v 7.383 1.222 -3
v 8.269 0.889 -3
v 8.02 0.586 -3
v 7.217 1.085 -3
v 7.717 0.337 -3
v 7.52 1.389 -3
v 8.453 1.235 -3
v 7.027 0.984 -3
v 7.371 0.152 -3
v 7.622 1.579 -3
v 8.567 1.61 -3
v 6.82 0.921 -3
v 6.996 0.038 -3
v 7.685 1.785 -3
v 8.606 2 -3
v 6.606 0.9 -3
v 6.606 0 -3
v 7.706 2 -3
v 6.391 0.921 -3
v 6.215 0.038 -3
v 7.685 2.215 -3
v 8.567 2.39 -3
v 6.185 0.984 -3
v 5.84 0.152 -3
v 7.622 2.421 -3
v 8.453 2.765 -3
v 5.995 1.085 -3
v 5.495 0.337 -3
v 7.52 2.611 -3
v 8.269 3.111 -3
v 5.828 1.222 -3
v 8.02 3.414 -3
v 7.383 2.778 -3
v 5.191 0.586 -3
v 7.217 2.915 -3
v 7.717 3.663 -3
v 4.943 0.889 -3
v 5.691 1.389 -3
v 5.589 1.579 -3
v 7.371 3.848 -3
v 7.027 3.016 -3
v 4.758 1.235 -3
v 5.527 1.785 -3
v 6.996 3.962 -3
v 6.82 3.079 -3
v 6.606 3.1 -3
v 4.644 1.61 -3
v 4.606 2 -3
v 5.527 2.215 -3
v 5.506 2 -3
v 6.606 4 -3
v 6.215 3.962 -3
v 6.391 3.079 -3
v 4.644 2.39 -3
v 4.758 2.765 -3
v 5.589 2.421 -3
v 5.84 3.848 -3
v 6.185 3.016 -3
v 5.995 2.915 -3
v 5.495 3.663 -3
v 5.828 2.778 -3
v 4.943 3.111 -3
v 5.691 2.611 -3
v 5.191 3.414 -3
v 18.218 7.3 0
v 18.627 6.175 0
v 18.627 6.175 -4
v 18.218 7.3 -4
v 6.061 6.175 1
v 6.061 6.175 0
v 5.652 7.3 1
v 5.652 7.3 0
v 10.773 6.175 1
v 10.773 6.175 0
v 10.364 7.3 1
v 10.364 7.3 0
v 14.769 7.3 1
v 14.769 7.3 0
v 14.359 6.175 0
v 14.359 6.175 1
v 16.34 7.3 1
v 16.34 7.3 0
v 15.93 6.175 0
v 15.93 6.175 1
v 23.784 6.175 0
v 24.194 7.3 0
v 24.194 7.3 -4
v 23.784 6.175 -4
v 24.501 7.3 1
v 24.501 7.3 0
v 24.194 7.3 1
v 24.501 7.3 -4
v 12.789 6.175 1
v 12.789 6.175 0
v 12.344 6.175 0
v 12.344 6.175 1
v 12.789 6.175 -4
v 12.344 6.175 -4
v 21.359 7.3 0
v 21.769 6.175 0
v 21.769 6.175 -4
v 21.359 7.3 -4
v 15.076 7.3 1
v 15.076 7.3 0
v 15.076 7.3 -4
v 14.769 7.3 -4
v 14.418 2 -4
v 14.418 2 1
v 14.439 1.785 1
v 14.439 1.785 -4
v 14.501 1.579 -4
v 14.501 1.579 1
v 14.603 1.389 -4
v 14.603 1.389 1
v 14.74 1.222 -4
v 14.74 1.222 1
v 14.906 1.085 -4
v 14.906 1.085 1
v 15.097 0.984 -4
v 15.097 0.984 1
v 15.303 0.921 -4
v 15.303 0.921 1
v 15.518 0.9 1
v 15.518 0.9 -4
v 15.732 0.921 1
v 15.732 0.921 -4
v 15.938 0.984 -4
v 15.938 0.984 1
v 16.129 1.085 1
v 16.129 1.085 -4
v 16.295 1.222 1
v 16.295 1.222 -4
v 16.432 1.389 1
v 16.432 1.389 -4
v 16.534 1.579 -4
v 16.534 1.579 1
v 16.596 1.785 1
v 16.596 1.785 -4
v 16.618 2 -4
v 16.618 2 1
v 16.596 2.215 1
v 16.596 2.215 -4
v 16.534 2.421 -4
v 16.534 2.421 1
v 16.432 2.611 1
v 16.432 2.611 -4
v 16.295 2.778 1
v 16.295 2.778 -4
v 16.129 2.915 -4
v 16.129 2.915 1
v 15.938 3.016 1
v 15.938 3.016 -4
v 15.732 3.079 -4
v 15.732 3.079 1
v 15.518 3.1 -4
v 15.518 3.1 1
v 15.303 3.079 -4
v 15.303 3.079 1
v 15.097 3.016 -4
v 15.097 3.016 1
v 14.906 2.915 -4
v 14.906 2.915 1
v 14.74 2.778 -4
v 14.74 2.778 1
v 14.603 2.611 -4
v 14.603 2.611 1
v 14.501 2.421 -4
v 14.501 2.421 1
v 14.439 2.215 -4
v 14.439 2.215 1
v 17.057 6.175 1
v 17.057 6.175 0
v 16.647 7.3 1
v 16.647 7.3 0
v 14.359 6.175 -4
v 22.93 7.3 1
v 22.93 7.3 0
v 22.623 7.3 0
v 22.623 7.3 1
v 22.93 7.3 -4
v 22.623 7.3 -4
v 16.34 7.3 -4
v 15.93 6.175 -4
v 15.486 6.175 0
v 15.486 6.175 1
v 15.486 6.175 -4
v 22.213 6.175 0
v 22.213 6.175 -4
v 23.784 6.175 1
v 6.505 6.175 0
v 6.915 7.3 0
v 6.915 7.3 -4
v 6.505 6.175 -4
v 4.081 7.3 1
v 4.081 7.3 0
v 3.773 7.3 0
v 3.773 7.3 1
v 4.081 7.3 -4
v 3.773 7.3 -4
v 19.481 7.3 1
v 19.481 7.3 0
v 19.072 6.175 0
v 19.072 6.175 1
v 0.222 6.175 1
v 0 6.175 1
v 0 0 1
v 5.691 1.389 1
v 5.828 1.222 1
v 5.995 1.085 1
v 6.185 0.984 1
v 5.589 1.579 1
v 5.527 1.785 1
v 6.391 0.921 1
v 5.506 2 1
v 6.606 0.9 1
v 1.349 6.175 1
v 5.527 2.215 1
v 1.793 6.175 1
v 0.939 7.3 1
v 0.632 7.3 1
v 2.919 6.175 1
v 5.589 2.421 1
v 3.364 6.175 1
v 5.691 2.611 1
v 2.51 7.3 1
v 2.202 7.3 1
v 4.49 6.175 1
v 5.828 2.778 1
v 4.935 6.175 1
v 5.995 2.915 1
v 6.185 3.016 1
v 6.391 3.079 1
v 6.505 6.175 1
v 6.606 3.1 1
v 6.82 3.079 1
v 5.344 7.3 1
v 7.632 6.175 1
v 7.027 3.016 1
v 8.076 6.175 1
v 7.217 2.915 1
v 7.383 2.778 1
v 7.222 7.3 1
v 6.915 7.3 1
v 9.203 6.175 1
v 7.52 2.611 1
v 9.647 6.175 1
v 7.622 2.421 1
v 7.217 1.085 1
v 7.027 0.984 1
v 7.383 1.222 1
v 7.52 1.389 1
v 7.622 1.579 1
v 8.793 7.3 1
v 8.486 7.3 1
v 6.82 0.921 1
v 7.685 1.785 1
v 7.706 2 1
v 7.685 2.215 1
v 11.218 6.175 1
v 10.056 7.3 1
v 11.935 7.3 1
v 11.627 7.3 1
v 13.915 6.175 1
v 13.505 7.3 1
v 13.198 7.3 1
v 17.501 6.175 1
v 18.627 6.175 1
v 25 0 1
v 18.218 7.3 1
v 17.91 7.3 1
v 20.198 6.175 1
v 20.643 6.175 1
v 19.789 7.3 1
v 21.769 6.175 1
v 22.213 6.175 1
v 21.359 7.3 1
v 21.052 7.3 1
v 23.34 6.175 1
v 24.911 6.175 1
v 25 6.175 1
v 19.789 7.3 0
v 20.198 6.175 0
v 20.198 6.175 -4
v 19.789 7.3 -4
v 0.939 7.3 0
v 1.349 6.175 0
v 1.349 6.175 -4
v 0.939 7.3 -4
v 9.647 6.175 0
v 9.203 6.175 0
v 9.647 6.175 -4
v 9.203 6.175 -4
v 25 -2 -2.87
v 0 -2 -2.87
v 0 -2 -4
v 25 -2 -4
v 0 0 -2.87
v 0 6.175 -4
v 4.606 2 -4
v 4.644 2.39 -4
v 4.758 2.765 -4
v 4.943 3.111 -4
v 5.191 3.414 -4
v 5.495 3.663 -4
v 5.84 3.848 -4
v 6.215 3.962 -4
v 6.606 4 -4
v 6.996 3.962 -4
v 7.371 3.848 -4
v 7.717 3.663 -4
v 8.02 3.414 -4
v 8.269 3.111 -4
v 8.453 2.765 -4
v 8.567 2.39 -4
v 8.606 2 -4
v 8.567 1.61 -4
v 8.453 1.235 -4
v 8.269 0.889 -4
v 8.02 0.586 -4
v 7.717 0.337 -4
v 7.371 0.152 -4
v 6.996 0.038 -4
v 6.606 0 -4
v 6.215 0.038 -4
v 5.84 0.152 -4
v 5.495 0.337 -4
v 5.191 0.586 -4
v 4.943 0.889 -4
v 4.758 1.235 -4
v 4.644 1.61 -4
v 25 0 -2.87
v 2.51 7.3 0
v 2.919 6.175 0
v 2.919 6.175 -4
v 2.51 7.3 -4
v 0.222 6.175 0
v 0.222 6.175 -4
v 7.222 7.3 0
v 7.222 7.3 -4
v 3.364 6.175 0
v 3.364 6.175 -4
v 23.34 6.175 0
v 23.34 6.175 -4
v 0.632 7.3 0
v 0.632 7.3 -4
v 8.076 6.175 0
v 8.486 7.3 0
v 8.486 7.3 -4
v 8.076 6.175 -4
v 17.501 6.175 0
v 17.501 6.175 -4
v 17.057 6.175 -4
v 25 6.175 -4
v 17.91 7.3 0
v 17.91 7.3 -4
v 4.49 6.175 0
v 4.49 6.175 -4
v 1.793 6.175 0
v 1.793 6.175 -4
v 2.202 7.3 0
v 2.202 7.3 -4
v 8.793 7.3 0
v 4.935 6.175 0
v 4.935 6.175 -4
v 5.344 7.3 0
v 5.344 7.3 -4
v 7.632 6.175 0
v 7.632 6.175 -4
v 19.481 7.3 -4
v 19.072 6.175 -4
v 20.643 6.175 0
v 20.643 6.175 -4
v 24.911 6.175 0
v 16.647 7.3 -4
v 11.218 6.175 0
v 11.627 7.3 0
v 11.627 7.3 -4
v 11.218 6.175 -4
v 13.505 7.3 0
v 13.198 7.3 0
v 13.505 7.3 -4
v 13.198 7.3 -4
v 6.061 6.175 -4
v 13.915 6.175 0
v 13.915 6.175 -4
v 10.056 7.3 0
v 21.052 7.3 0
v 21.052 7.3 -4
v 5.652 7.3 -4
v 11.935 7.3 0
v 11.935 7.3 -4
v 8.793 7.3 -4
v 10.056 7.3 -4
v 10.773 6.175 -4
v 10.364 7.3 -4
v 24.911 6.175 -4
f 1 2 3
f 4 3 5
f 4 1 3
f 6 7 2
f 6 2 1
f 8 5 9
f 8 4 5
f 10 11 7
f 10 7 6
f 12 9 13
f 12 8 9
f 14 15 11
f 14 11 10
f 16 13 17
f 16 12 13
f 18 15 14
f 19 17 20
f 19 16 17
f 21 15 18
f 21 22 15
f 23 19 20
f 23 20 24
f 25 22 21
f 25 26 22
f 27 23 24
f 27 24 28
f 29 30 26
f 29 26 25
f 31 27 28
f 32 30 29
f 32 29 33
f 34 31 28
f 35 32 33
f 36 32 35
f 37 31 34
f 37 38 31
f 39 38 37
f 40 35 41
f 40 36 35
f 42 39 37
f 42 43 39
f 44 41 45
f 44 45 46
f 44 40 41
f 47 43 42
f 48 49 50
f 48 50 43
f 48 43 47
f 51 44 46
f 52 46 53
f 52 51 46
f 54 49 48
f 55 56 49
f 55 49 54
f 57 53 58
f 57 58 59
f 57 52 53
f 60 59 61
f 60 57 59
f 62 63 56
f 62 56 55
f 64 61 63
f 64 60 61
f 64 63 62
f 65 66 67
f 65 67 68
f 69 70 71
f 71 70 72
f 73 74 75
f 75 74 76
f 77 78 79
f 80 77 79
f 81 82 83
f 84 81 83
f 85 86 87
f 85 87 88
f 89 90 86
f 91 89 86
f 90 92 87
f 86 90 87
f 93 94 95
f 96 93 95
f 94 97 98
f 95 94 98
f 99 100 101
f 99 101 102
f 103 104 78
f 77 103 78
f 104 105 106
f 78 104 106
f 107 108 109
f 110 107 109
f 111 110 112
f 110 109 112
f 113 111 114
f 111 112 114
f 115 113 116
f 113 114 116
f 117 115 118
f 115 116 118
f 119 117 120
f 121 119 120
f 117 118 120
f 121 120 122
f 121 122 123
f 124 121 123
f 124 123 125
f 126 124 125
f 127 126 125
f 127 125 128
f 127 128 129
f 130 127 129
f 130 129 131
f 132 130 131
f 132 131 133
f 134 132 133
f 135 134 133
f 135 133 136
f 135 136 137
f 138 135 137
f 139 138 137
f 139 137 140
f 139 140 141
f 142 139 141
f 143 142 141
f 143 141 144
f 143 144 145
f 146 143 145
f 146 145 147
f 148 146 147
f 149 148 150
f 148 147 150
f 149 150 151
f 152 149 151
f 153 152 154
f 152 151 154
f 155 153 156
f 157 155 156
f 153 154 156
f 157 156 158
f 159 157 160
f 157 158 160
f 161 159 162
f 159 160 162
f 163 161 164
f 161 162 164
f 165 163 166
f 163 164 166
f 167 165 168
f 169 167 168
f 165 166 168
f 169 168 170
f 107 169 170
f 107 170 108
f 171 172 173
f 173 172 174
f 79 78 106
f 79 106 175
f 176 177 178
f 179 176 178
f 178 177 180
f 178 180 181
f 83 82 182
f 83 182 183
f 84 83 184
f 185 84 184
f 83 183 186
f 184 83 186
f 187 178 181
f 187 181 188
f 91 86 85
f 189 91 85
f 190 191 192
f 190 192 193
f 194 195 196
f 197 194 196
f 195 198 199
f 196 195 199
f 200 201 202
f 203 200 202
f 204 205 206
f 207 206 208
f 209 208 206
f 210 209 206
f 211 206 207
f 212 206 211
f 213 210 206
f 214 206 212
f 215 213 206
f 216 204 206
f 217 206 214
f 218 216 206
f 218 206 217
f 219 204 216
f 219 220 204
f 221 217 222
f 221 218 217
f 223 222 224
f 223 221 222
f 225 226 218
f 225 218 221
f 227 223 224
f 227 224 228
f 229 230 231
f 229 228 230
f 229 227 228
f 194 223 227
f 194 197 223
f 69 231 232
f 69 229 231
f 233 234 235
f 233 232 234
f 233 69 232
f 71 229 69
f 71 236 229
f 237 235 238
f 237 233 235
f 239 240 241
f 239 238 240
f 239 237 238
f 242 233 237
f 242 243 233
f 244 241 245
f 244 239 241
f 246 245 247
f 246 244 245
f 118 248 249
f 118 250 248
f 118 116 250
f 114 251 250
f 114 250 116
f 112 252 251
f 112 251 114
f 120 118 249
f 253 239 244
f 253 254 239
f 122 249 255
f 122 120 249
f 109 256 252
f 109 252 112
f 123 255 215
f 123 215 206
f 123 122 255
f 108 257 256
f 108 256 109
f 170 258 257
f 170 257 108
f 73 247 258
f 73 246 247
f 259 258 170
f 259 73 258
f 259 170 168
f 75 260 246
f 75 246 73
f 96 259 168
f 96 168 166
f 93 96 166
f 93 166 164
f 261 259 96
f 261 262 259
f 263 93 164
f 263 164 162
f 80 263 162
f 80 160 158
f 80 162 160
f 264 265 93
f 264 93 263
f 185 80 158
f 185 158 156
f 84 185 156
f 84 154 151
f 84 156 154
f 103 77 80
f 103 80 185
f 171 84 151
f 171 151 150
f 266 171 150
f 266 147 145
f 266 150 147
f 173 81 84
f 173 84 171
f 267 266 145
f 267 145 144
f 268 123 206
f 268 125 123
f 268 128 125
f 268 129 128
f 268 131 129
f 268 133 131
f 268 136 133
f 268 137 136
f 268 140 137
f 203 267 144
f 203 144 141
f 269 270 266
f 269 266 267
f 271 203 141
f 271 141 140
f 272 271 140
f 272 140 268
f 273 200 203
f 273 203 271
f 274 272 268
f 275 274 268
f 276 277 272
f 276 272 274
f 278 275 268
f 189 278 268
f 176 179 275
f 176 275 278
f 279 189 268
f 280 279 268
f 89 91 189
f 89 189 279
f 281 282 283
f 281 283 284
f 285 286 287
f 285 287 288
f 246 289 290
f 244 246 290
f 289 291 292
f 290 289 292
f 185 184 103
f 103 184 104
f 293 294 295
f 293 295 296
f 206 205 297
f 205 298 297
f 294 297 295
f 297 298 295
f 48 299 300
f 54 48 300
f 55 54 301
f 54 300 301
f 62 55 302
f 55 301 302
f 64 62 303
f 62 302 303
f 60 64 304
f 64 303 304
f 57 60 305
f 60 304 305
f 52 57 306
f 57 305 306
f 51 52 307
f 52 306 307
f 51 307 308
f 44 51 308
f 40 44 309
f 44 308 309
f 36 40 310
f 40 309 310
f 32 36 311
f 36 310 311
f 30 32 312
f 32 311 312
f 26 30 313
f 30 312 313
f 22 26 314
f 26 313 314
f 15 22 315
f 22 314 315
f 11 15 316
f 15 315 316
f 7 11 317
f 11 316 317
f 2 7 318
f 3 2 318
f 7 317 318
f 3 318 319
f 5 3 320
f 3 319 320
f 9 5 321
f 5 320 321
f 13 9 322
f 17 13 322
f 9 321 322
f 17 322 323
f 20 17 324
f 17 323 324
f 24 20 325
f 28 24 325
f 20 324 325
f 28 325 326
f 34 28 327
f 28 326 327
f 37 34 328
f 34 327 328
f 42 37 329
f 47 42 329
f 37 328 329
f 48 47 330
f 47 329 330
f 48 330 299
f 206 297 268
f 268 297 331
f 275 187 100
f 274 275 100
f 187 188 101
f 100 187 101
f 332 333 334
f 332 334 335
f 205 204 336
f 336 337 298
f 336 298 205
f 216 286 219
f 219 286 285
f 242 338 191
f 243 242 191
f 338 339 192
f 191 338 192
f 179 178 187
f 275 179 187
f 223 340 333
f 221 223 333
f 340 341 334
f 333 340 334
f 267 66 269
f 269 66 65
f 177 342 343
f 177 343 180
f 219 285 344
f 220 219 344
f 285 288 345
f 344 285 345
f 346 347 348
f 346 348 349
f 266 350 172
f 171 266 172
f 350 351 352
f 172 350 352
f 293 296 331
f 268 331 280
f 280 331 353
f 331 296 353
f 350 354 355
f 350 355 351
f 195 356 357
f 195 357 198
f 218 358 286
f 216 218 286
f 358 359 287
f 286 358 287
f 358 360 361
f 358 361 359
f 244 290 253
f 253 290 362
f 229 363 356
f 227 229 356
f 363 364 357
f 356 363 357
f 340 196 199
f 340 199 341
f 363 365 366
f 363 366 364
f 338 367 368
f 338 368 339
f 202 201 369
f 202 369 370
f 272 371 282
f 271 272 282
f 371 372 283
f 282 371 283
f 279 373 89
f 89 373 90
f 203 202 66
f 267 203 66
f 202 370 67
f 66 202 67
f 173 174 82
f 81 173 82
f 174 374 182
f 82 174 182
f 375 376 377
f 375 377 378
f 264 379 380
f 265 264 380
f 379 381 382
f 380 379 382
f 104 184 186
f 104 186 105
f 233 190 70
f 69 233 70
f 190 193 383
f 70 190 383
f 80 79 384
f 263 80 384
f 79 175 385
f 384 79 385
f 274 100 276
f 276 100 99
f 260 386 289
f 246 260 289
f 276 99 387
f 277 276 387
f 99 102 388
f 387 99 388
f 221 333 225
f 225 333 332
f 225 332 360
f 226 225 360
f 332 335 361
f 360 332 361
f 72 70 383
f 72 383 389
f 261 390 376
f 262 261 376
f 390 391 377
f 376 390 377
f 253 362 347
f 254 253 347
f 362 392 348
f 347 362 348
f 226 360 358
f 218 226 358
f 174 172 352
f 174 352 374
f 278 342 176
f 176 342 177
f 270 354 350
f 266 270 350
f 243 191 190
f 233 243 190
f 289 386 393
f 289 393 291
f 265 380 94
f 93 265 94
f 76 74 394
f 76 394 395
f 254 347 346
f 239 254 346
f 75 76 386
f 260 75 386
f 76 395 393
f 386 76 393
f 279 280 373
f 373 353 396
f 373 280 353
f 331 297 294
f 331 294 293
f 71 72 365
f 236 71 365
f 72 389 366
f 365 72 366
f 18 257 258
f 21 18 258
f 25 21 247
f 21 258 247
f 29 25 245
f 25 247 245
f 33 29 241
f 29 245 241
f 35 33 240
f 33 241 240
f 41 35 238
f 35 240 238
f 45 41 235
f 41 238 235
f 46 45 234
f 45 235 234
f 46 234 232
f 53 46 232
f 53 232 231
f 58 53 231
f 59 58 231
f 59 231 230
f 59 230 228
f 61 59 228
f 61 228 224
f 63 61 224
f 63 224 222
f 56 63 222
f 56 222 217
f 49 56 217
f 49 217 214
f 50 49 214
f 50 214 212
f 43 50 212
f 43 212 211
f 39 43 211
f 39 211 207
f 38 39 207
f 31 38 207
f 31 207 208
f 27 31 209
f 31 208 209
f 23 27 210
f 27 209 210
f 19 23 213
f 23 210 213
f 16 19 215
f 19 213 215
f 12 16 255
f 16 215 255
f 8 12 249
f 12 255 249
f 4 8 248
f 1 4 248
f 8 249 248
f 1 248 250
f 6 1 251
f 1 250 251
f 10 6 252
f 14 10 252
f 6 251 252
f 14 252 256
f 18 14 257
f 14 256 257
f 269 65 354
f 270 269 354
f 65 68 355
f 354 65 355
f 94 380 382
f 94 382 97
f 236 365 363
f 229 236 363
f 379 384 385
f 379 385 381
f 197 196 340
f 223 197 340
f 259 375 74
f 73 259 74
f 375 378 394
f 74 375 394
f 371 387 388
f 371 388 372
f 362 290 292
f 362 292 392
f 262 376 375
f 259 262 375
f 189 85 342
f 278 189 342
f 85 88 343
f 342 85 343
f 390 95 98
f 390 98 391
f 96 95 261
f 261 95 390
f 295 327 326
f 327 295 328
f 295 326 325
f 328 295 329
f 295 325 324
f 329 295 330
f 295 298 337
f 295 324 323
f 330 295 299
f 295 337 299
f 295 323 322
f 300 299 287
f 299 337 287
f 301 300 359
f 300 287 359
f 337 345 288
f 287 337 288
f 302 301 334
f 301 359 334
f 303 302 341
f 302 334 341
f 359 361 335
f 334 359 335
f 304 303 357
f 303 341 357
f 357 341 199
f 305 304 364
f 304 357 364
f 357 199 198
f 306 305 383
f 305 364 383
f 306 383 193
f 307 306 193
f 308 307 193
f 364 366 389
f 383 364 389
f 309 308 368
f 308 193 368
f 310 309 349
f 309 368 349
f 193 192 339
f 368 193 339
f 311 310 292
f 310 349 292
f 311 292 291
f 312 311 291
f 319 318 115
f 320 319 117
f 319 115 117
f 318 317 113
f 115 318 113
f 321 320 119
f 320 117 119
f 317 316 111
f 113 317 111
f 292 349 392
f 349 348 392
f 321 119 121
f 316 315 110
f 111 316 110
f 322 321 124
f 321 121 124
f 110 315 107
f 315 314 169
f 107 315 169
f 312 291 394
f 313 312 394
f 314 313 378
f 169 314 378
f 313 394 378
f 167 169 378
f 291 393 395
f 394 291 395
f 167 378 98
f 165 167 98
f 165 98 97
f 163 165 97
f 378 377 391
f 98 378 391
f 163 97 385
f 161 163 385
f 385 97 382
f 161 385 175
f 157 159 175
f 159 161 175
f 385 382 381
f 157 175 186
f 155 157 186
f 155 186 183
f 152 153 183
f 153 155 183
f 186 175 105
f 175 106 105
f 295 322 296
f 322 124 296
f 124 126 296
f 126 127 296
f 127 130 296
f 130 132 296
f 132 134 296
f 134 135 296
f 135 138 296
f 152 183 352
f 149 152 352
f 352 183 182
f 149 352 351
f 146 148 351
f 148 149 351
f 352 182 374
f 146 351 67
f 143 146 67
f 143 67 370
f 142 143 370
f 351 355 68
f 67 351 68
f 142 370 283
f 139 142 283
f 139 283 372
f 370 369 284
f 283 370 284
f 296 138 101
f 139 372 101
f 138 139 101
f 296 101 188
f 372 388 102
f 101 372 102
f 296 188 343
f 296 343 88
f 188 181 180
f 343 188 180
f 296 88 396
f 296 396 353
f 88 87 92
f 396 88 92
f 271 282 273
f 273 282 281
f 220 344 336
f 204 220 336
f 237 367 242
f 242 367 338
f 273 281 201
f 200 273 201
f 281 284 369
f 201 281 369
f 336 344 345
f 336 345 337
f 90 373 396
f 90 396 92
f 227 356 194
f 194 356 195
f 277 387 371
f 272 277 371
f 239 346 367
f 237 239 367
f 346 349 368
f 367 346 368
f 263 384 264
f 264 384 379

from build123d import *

# Parameters (mm, degrees)
BLANKSKE_W          = 25
BLANKSKE_H          = 7.3
BLANK_DEPTH         = 4
TOOTHCUTSIM_DEPTH   = 27.349383294
TEETHCUTS_COUNT     = 17
TEETHCUTS_PITCH     = 1.570796325
SKETCH4_W           = 25
SKETCH4_H           = 1.13
BOSS_EXTRUDE1_DEPTH = 2
BOSS_EXTRUDE2_DEPTH = 1
CUT_EXTRUDE1_DEPTH  = 10
SKETCH10_R          = 2
CUT_EXTRUDE3_DEPTH  = 1


with BuildPart() as part:
    # BlankSke → Blank (new body)
    with BuildSketch(Plane.XY):
        with Locations((12.5, 3.65)):
            Rectangle(BLANKSKE_W, BLANKSKE_H)
    extrude(amount=-BLANK_DEPTH)

    # TooCutSkeSim → ToothCutSim (cut, through all)
    with BuildSketch(Plane.XY):
        Polygon((0.222217685, 6.175), (-0.222217685, 6.175), (-0.640929042, 7.3254), (0.640929042, 7.3254), align=None)
    toothcutsim = extrude(amount=-TOOTHCUTSIM_DEPTH, mode=Mode.SUBTRACT)

    # TeethCuts: ToothCutSim ×17
    with Locations(*[(i * TEETHCUTS_PITCH, 0, 0) for i in range(1, TEETHCUTS_COUNT)]):
        add(toothcutsim, mode=Mode.SUBTRACT)

    # Sketch4 → Boss-Extrude1 (add)
    with BuildSketch(Plane.XZ):
        with Locations((12.5, -3.435)):
            Rectangle(SKETCH4_W, SKETCH4_H)
    extrude(amount=BOSS_EXTRUDE1_DEPTH)

    # Sketch7 → Boss-Extrude2 (add)
    with BuildSketch(Plane.XY):
        Polygon((25, 6.175), (24.910523515, 6.175), (24.501057002, 7.3), (24.193629073, 7.3), (23.78416256, 6.175), (23.33972719, 6.175), (22.930260677, 7.3), (22.622832748, 7.3), (22.213366235, 6.175), (21.768930865, 6.175), (21.359464352, 7.3), (21.052036423, 7.3), (20.64256991, 6.175), (20.19813454, 6.175), (19.788668027, 7.3), (19.481240098, 7.3), (19.071773585, 6.175), (18.627338215, 6.175), (18.217871702, 7.3), (17.910443773, 7.3), (17.50097726, 6.175), (17.05654189, 6.175), (16.647075377, 7.3), (16.339647448, 7.3), (15.930180935, 6.175), (15.485745565, 6.175), (15.076279052, 7.3), (14.768851123, 7.3), (14.35938461, 6.175), (13.91494924, 6.175), (13.505482727, 7.3), (13.198054798, 7.3), (12.788588285, 6.175), (12.344152915, 6.175), (11.934686402, 7.3), (11.627258473, 7.3), (11.21779196, 6.175), (10.77335659, 6.175), (10.363890077, 7.3), (10.056462148, 7.3), (9.646995635, 6.175), (9.202560265, 6.175), (8.793093752, 7.3), (8.485665823, 7.3), (8.07619931, 6.175), (7.63176394, 6.175), (7.222297427, 7.3), (6.914869498, 7.3), (6.505402985, 6.175), (6.060967615, 6.175), (5.651501102, 7.3), (5.344073173, 7.3), (4.93460666, 6.175), (4.49017129, 6.175), (4.080704777, 7.3), (3.773276848, 7.3), (3.363810335, 6.175), (2.919374965, 6.175), (2.509908452, 7.3), (2.202480523, 7.3), (1.79301401, 6.175), (1.34857864, 6.175), (0.939112127, 7.3), (0.631684198, 7.3), (0.222217685, 6.175), (0, 6.175), (0, 0), (25, 0), align=None)
    extrude(amount=BOSS_EXTRUDE2_DEPTH)

    # Sketch8 → Cut-Extrude1 (cut)
    with BuildSketch(Plane.XY.offset(1)):
        with BuildLine():
            ThreePointArc((16.617517337, 2), (15.517517337, 3.1), (14.417517337, 2))
            Line((14.417517337, 2), (15.517517337, 2))
            Line((15.517517337, 2), (16.617517337, 2))
        make_face()
        with BuildLine():
            Line((15.517517337, 2), (14.417517337, 2))
            ThreePointArc((14.417517337, 2), (15.517517337, 0.9), (16.617517337, 2))
            Line((16.617517337, 2), (15.517517337, 2))
        make_face()
        with BuildLine():
            ThreePointArc((16.617517337, 2), (15.517517337, 3.1), (14.417517337, 2))
            Line((14.417517337, 2), (15.517517337, 2))
            Line((15.517517337, 2), (16.617517337, 2))
        make_face()
        with BuildLine():
            Line((15.517517337, 2), (14.417517337, 2))
            ThreePointArc((14.417517337, 2), (15.517517337, 0.9), (16.617517337, 2))
            Line((16.617517337, 2), (15.517517337, 2))
        make_face()
        with BuildLine():
            Line((7.705669439, 2), (6.605669439, 2))
            Line((6.605669439, 2), (5.505669439, 2))
            ThreePointArc((5.505669439, 2), (6.605669439, 0.9), (7.705669439, 2))
        make_face()
        with BuildLine():
            Line((5.505669439, 2), (6.605669439, 2))
            Line((6.605669439, 2), (7.705669439, 2))
            ThreePointArc((7.705669439, 2), (6.605669439, 3.1), (5.505669439, 2))
        make_face()
        with BuildLine():
            Line((7.705669439, 2), (6.605669439, 2))
            Line((6.605669439, 2), (5.505669439, 2))
            ThreePointArc((5.505669439, 2), (6.605669439, 0.9), (7.705669439, 2))
        make_face()
        with BuildLine():
            Line((5.505669439, 2), (6.605669439, 2))
            Line((6.605669439, 2), (7.705669439, 2))
            ThreePointArc((7.705669439, 2), (6.605669439, 3.1), (5.505669439, 2))
        make_face()
    extrude(amount=-CUT_EXTRUDE1_DEPTH, mode=Mode.SUBTRACT)

    # Sketch10 → Cut-Extrude3 (cut)
    with BuildSketch(Plane(origin=(0, 0, -4), x_dir=(-1, 0, 0), z_dir=(0, 0, -1))):
        with Locations((-6.605669439, 2)):
            Circle(SKETCH10_R)
    extrude(amount=-CUT_EXTRUDE3_DEPTH, mode=Mode.SUBTRACT)


solid = part.part
